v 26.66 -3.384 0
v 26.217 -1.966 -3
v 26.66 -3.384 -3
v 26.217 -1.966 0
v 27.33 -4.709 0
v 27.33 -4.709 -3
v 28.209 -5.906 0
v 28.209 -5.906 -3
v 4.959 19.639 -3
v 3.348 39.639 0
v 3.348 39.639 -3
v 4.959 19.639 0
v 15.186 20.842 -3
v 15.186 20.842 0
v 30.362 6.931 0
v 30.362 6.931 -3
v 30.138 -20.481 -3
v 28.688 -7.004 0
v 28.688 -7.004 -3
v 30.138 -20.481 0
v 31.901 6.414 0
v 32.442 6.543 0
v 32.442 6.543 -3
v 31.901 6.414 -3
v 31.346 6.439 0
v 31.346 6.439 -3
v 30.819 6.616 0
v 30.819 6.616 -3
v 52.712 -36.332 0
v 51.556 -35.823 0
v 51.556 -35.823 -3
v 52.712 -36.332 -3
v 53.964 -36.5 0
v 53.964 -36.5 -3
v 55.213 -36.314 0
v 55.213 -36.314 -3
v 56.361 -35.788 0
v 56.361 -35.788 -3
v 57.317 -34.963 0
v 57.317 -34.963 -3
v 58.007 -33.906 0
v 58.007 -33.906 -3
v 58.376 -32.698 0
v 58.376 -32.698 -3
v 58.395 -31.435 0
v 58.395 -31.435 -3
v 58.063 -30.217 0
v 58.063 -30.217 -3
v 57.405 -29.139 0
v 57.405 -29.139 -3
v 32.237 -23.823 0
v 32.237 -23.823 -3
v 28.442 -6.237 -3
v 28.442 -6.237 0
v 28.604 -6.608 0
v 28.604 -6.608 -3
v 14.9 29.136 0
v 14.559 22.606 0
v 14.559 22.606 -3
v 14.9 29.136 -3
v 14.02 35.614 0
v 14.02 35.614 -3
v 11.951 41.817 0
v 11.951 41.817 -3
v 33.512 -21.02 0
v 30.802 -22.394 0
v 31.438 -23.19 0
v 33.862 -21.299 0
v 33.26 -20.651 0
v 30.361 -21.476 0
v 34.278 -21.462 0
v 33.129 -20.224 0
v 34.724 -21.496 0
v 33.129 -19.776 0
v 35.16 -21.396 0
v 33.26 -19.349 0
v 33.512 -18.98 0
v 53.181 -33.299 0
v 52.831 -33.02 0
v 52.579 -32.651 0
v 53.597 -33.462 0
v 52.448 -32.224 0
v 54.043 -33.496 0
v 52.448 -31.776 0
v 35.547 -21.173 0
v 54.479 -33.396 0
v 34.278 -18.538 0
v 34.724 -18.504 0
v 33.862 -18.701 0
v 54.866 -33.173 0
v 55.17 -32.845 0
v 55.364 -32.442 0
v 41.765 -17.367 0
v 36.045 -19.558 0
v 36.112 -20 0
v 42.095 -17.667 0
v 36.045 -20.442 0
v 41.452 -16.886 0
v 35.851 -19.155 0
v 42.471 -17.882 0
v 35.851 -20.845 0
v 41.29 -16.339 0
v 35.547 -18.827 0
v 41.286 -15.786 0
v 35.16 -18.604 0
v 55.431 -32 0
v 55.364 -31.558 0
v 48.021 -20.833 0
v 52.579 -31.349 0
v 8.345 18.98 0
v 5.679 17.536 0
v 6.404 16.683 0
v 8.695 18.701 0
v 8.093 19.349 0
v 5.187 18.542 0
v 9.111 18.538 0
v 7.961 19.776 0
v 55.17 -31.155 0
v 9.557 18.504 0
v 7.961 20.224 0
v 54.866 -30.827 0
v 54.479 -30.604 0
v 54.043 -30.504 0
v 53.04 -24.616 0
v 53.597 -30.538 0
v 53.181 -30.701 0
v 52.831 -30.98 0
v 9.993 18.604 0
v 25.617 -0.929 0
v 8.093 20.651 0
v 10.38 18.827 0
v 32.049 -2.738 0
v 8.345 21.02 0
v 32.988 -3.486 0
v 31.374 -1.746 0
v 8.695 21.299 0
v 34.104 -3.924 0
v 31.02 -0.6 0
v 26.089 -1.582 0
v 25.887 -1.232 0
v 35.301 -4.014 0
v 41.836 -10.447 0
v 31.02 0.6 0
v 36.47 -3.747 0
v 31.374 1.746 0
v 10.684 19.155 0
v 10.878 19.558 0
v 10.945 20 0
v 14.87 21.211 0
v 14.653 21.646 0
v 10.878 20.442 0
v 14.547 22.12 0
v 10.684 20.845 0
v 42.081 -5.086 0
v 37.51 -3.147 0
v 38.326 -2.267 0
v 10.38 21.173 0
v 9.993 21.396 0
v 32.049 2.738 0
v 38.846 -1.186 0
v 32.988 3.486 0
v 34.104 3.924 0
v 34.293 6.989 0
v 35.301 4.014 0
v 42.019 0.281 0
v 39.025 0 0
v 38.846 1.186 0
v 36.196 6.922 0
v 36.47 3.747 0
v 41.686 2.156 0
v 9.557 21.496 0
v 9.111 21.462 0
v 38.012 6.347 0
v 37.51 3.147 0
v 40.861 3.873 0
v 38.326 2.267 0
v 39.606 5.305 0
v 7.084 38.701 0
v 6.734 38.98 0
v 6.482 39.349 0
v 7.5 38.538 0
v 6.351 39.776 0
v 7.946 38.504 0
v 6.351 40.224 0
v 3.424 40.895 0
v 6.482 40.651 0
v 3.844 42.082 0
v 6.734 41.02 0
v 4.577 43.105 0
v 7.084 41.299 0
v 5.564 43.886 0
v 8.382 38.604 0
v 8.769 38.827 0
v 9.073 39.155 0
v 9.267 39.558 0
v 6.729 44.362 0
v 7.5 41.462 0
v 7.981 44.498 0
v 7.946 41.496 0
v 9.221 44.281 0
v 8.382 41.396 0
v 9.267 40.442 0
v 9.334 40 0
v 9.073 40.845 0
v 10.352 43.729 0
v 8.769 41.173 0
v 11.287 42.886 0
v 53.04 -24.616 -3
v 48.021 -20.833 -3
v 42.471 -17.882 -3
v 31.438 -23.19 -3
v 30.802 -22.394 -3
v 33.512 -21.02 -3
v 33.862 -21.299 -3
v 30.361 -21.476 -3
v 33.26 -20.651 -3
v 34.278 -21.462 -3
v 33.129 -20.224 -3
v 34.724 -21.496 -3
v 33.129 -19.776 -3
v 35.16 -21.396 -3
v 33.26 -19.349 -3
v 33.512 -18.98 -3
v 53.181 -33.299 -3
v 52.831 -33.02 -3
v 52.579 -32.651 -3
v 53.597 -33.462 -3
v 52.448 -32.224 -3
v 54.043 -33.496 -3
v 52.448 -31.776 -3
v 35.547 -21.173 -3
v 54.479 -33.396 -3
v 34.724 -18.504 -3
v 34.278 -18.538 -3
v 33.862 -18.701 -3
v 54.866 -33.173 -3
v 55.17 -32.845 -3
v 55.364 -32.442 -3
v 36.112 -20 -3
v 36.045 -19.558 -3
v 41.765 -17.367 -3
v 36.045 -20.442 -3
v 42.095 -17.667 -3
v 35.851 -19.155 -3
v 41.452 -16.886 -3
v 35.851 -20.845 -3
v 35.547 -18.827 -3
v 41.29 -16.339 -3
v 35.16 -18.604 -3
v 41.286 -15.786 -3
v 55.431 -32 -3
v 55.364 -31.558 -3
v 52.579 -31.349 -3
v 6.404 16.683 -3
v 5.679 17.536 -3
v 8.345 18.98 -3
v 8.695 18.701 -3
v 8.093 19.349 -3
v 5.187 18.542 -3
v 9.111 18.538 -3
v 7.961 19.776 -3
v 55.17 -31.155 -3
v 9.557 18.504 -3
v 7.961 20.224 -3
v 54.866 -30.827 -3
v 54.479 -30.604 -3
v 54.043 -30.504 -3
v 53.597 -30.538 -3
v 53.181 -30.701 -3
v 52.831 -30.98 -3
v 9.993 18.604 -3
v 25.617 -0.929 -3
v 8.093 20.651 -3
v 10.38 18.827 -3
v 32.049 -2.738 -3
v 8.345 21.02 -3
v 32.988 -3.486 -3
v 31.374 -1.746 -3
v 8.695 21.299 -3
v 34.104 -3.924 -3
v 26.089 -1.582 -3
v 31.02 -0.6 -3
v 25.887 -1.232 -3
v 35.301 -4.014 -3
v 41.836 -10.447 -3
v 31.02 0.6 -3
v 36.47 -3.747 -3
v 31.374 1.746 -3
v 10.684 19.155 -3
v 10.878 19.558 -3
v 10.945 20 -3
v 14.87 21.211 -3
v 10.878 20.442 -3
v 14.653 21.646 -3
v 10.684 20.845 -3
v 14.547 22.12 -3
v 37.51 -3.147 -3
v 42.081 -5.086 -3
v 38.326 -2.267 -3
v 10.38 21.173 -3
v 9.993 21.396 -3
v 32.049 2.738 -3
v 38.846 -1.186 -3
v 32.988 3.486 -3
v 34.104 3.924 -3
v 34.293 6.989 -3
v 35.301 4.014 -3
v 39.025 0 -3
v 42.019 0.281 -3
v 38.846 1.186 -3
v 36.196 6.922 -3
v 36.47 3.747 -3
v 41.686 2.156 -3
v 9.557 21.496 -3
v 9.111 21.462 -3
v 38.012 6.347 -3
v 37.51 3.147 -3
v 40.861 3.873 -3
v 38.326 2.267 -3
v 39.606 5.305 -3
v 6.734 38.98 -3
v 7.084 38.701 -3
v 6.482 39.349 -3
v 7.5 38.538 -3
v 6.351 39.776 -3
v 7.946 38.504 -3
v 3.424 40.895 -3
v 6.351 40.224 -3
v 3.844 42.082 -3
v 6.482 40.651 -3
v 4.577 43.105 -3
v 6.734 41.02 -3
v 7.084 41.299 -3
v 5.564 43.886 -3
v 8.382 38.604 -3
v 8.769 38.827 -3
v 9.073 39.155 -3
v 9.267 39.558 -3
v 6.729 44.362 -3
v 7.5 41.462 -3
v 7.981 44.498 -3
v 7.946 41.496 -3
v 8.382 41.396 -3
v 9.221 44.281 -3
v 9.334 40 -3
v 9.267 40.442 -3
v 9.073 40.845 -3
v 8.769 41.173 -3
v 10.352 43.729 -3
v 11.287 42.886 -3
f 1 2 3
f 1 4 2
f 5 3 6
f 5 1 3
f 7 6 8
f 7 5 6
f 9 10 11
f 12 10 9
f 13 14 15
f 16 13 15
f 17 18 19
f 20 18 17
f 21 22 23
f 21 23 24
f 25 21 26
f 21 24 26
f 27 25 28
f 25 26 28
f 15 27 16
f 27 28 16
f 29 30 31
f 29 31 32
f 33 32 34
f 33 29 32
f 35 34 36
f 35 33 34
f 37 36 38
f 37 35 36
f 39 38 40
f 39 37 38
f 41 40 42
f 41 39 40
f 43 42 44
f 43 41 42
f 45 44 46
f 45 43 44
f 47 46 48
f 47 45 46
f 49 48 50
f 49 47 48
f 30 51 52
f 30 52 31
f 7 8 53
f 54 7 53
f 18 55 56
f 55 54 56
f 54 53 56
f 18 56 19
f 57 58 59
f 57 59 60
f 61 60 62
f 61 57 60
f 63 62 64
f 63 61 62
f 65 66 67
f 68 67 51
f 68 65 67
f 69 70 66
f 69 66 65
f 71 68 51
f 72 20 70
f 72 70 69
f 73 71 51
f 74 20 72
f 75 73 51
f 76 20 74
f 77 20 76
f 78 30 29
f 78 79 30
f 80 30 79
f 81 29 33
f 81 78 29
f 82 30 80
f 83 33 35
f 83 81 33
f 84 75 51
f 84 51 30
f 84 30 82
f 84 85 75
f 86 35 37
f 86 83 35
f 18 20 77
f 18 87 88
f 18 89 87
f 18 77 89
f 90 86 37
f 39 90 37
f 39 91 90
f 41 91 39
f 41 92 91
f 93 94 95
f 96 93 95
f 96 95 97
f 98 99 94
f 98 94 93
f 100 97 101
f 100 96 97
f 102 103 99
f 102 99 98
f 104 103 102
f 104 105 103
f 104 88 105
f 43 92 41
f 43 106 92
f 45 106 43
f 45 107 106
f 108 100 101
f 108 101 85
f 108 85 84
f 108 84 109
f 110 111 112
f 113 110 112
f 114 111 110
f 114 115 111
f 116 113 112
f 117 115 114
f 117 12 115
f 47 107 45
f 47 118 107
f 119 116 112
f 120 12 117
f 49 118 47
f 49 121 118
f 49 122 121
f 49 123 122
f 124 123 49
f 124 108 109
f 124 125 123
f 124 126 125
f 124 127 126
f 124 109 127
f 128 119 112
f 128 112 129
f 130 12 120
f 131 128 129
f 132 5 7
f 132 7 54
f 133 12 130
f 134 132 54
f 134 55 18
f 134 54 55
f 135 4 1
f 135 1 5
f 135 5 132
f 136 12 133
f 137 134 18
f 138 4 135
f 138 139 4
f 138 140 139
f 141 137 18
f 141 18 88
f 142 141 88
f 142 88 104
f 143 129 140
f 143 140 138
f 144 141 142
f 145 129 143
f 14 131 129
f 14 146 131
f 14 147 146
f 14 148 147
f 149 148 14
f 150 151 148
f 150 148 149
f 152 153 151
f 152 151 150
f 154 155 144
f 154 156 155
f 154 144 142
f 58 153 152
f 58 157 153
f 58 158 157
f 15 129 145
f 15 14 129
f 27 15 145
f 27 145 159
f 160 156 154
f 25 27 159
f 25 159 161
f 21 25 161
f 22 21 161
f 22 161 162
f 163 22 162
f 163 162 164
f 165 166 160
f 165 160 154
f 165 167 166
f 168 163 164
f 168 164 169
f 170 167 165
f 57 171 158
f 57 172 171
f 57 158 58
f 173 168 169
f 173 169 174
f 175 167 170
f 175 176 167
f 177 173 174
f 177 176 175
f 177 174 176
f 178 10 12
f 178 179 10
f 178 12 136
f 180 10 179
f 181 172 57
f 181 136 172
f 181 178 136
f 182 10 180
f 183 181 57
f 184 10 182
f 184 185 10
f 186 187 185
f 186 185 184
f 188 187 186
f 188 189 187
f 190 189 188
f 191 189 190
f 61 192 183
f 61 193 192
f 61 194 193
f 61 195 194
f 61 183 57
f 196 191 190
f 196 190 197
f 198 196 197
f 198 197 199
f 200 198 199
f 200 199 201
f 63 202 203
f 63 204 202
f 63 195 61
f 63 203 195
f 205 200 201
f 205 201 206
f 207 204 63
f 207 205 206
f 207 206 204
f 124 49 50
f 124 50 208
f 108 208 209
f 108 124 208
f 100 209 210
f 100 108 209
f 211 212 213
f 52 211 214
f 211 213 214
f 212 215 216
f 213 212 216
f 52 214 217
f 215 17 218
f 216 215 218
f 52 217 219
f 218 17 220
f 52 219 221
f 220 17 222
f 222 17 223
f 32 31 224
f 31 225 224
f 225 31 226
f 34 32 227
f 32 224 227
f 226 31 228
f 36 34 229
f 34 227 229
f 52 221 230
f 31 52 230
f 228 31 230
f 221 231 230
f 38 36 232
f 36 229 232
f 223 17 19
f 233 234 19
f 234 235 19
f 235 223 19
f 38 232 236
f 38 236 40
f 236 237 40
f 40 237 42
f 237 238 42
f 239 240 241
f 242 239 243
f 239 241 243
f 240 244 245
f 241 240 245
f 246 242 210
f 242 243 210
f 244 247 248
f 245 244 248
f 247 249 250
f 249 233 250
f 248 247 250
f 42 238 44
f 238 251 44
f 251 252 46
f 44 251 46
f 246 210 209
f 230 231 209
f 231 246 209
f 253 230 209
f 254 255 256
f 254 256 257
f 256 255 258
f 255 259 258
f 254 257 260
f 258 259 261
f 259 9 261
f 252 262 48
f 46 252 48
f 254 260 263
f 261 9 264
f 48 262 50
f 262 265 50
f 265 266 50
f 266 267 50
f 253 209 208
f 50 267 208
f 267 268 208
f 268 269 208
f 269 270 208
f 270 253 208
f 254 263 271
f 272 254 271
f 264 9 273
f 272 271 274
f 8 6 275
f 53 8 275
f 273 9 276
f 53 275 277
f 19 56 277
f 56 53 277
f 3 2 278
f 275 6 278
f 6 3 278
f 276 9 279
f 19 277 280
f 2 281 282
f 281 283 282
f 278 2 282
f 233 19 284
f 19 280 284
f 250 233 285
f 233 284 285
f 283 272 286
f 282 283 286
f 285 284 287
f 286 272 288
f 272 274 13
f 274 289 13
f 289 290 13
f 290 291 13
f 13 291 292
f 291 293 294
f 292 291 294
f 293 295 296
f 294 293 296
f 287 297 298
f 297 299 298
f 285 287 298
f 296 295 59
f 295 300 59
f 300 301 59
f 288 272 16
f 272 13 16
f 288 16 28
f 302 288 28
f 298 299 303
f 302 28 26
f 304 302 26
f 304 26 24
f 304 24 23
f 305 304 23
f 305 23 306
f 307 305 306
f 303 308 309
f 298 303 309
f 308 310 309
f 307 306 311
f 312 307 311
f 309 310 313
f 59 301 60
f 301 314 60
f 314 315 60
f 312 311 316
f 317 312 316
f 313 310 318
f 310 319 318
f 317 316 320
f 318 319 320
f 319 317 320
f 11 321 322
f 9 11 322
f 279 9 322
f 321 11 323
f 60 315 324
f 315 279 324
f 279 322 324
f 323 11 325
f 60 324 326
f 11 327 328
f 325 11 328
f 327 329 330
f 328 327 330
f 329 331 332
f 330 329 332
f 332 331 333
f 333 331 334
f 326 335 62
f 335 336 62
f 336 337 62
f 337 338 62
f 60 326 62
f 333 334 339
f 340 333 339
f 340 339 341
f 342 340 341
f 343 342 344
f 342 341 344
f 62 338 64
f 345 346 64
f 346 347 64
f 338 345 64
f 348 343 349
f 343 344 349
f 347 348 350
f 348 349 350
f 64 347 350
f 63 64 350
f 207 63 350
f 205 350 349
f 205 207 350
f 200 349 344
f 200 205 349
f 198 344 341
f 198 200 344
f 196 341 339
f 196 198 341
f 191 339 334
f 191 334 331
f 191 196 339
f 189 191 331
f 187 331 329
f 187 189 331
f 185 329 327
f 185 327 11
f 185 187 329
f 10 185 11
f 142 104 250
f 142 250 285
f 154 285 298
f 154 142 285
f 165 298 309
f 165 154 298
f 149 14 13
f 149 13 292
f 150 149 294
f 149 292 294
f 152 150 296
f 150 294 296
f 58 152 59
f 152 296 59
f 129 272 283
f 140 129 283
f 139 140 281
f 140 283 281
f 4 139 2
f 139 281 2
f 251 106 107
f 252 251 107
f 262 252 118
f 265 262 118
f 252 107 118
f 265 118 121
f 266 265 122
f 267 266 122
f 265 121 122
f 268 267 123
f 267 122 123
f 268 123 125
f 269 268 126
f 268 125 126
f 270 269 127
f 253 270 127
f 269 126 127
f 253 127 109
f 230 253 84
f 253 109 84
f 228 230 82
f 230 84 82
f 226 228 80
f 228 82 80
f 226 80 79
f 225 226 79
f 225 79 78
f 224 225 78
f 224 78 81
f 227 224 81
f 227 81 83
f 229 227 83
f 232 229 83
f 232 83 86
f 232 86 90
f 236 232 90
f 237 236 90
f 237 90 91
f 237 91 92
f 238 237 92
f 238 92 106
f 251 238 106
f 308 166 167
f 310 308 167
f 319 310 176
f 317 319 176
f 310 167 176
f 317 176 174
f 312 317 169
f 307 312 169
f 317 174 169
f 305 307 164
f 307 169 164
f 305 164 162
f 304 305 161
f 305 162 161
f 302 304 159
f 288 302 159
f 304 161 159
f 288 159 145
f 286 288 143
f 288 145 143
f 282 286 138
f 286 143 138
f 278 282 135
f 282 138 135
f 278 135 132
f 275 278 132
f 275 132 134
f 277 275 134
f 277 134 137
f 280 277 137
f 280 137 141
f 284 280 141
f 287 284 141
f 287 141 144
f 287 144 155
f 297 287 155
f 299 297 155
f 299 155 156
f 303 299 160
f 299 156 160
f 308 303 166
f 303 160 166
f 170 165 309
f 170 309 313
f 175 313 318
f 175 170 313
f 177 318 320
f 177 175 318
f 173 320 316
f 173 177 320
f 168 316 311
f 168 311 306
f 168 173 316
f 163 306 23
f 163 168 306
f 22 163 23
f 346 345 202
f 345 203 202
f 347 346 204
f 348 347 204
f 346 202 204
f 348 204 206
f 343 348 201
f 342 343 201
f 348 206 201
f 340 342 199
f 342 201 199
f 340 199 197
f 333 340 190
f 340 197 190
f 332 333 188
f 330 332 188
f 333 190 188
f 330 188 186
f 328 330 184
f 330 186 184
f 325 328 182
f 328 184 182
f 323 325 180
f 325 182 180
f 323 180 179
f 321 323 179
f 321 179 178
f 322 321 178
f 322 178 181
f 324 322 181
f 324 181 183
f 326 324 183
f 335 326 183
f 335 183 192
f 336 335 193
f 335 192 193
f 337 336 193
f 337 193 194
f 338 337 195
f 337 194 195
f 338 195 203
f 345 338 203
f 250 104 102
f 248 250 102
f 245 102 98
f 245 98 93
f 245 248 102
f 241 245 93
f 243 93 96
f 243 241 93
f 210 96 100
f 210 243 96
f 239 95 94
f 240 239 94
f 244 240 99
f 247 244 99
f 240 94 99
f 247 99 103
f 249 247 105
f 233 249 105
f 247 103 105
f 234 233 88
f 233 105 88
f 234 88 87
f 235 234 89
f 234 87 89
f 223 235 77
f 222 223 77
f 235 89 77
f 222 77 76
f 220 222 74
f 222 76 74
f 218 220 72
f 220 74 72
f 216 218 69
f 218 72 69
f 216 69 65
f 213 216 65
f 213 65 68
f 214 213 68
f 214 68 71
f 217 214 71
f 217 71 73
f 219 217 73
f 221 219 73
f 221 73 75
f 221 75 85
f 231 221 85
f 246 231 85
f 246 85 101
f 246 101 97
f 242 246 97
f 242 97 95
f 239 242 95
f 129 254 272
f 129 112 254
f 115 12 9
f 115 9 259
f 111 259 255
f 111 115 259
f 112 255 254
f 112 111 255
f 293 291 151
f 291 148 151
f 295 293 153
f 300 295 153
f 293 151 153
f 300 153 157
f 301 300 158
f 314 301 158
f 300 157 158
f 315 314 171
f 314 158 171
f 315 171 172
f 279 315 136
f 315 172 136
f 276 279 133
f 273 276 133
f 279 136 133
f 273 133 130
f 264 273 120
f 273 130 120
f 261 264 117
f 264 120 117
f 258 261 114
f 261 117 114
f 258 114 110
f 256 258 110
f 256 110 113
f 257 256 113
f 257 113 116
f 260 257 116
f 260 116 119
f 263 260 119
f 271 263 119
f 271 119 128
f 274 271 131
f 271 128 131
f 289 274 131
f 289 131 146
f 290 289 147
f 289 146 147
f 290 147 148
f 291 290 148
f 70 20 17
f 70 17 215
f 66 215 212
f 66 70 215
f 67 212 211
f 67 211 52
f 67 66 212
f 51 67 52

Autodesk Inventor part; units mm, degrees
ref_plane "YZ Plane" through (0, 0, 0) normal (1, 0, 0) x (0, 1, 0)
ref_plane "XZ Plane" through (0, 0, 0) normal (0, 1, 0) x (-1, 0, 0)
ref_plane "XY Plane" through (0, 0, 0) normal (0, 0, 1) x (1, 0, 0)
sketch "Sketch1" plane through (0, 0, 0) normal (0, 0, 1) x (1, 0, 0)
  circle A0 centre (7.8339, 40) radius 4.5
  circle A1 centre (7.8339, 40) radius 1.5
  circle A2 centre (9.4447, 20) radius 4.5
  circle A3 centre (9.4447, 20) radius 1.5
  circle A4 centre (34.6118, -20) radius 4.5
  circle A5 centre (34.6118, -20) radius 1.5
  circle A6 centre (53.9309, -32) radius 4.5
  circle A7 centre (53.9309, -32) radius 1.5
  line L0 (3.3484, 39.6387) -> (4.9593, 19.6387)
  circle A8 centre (35, 0) radius 7.025
  line L1 (6.404, 16.6828) -> (26.106, -1.3771)
  line L2 (28.617, -6.3449) -> (30.1377, -20.4813)
  line L3 (32.2374, -23.8226) -> (51.5565, -35.8226)
  circle A9 centre (35, 0) radius 4.025
  line L4 (14.3908, 21.5707) -> (31.3649, 6.0114)
  arc A10 (14.3908, 21.5707) -> (11.951, 41.8166) centre (-20.0705, 27.6877) ccw
  arc A11 (57.4046, -29.1394) -> (41.0725, -17.3055) centre (26.5269, -54.5671) ccw
  arc A12 (41.0725, -17.3055) -> (42.0194, 0.2811) centre (-51.9053, -3.4806) ccw
  arc A13 (26.106, -1.3771) -> (28.617, -6.3449) centre (35, 0) ccw
  dimension "d9" = 14.05
  dimension "d10" = 8.05
  dimension "d11" = 35
  dimension "d12" = 40
  dimension "d13" = 94
  dimension "d15" = 7
extrude "Extrusion1" add sketch "Sketch1" against normal blind 3
fillet "Fillet1" radius 2 5 edges at (26.106, -1.3771, -1.5) (28.617, -6.3449, -1.5) (14.3908, 21.5707, -1.5) (41.0725, -17.3055, -1.5) (31.3649, 6.0114, -1.5)
properties part number "アーノン" material "Aluminum 7075"
